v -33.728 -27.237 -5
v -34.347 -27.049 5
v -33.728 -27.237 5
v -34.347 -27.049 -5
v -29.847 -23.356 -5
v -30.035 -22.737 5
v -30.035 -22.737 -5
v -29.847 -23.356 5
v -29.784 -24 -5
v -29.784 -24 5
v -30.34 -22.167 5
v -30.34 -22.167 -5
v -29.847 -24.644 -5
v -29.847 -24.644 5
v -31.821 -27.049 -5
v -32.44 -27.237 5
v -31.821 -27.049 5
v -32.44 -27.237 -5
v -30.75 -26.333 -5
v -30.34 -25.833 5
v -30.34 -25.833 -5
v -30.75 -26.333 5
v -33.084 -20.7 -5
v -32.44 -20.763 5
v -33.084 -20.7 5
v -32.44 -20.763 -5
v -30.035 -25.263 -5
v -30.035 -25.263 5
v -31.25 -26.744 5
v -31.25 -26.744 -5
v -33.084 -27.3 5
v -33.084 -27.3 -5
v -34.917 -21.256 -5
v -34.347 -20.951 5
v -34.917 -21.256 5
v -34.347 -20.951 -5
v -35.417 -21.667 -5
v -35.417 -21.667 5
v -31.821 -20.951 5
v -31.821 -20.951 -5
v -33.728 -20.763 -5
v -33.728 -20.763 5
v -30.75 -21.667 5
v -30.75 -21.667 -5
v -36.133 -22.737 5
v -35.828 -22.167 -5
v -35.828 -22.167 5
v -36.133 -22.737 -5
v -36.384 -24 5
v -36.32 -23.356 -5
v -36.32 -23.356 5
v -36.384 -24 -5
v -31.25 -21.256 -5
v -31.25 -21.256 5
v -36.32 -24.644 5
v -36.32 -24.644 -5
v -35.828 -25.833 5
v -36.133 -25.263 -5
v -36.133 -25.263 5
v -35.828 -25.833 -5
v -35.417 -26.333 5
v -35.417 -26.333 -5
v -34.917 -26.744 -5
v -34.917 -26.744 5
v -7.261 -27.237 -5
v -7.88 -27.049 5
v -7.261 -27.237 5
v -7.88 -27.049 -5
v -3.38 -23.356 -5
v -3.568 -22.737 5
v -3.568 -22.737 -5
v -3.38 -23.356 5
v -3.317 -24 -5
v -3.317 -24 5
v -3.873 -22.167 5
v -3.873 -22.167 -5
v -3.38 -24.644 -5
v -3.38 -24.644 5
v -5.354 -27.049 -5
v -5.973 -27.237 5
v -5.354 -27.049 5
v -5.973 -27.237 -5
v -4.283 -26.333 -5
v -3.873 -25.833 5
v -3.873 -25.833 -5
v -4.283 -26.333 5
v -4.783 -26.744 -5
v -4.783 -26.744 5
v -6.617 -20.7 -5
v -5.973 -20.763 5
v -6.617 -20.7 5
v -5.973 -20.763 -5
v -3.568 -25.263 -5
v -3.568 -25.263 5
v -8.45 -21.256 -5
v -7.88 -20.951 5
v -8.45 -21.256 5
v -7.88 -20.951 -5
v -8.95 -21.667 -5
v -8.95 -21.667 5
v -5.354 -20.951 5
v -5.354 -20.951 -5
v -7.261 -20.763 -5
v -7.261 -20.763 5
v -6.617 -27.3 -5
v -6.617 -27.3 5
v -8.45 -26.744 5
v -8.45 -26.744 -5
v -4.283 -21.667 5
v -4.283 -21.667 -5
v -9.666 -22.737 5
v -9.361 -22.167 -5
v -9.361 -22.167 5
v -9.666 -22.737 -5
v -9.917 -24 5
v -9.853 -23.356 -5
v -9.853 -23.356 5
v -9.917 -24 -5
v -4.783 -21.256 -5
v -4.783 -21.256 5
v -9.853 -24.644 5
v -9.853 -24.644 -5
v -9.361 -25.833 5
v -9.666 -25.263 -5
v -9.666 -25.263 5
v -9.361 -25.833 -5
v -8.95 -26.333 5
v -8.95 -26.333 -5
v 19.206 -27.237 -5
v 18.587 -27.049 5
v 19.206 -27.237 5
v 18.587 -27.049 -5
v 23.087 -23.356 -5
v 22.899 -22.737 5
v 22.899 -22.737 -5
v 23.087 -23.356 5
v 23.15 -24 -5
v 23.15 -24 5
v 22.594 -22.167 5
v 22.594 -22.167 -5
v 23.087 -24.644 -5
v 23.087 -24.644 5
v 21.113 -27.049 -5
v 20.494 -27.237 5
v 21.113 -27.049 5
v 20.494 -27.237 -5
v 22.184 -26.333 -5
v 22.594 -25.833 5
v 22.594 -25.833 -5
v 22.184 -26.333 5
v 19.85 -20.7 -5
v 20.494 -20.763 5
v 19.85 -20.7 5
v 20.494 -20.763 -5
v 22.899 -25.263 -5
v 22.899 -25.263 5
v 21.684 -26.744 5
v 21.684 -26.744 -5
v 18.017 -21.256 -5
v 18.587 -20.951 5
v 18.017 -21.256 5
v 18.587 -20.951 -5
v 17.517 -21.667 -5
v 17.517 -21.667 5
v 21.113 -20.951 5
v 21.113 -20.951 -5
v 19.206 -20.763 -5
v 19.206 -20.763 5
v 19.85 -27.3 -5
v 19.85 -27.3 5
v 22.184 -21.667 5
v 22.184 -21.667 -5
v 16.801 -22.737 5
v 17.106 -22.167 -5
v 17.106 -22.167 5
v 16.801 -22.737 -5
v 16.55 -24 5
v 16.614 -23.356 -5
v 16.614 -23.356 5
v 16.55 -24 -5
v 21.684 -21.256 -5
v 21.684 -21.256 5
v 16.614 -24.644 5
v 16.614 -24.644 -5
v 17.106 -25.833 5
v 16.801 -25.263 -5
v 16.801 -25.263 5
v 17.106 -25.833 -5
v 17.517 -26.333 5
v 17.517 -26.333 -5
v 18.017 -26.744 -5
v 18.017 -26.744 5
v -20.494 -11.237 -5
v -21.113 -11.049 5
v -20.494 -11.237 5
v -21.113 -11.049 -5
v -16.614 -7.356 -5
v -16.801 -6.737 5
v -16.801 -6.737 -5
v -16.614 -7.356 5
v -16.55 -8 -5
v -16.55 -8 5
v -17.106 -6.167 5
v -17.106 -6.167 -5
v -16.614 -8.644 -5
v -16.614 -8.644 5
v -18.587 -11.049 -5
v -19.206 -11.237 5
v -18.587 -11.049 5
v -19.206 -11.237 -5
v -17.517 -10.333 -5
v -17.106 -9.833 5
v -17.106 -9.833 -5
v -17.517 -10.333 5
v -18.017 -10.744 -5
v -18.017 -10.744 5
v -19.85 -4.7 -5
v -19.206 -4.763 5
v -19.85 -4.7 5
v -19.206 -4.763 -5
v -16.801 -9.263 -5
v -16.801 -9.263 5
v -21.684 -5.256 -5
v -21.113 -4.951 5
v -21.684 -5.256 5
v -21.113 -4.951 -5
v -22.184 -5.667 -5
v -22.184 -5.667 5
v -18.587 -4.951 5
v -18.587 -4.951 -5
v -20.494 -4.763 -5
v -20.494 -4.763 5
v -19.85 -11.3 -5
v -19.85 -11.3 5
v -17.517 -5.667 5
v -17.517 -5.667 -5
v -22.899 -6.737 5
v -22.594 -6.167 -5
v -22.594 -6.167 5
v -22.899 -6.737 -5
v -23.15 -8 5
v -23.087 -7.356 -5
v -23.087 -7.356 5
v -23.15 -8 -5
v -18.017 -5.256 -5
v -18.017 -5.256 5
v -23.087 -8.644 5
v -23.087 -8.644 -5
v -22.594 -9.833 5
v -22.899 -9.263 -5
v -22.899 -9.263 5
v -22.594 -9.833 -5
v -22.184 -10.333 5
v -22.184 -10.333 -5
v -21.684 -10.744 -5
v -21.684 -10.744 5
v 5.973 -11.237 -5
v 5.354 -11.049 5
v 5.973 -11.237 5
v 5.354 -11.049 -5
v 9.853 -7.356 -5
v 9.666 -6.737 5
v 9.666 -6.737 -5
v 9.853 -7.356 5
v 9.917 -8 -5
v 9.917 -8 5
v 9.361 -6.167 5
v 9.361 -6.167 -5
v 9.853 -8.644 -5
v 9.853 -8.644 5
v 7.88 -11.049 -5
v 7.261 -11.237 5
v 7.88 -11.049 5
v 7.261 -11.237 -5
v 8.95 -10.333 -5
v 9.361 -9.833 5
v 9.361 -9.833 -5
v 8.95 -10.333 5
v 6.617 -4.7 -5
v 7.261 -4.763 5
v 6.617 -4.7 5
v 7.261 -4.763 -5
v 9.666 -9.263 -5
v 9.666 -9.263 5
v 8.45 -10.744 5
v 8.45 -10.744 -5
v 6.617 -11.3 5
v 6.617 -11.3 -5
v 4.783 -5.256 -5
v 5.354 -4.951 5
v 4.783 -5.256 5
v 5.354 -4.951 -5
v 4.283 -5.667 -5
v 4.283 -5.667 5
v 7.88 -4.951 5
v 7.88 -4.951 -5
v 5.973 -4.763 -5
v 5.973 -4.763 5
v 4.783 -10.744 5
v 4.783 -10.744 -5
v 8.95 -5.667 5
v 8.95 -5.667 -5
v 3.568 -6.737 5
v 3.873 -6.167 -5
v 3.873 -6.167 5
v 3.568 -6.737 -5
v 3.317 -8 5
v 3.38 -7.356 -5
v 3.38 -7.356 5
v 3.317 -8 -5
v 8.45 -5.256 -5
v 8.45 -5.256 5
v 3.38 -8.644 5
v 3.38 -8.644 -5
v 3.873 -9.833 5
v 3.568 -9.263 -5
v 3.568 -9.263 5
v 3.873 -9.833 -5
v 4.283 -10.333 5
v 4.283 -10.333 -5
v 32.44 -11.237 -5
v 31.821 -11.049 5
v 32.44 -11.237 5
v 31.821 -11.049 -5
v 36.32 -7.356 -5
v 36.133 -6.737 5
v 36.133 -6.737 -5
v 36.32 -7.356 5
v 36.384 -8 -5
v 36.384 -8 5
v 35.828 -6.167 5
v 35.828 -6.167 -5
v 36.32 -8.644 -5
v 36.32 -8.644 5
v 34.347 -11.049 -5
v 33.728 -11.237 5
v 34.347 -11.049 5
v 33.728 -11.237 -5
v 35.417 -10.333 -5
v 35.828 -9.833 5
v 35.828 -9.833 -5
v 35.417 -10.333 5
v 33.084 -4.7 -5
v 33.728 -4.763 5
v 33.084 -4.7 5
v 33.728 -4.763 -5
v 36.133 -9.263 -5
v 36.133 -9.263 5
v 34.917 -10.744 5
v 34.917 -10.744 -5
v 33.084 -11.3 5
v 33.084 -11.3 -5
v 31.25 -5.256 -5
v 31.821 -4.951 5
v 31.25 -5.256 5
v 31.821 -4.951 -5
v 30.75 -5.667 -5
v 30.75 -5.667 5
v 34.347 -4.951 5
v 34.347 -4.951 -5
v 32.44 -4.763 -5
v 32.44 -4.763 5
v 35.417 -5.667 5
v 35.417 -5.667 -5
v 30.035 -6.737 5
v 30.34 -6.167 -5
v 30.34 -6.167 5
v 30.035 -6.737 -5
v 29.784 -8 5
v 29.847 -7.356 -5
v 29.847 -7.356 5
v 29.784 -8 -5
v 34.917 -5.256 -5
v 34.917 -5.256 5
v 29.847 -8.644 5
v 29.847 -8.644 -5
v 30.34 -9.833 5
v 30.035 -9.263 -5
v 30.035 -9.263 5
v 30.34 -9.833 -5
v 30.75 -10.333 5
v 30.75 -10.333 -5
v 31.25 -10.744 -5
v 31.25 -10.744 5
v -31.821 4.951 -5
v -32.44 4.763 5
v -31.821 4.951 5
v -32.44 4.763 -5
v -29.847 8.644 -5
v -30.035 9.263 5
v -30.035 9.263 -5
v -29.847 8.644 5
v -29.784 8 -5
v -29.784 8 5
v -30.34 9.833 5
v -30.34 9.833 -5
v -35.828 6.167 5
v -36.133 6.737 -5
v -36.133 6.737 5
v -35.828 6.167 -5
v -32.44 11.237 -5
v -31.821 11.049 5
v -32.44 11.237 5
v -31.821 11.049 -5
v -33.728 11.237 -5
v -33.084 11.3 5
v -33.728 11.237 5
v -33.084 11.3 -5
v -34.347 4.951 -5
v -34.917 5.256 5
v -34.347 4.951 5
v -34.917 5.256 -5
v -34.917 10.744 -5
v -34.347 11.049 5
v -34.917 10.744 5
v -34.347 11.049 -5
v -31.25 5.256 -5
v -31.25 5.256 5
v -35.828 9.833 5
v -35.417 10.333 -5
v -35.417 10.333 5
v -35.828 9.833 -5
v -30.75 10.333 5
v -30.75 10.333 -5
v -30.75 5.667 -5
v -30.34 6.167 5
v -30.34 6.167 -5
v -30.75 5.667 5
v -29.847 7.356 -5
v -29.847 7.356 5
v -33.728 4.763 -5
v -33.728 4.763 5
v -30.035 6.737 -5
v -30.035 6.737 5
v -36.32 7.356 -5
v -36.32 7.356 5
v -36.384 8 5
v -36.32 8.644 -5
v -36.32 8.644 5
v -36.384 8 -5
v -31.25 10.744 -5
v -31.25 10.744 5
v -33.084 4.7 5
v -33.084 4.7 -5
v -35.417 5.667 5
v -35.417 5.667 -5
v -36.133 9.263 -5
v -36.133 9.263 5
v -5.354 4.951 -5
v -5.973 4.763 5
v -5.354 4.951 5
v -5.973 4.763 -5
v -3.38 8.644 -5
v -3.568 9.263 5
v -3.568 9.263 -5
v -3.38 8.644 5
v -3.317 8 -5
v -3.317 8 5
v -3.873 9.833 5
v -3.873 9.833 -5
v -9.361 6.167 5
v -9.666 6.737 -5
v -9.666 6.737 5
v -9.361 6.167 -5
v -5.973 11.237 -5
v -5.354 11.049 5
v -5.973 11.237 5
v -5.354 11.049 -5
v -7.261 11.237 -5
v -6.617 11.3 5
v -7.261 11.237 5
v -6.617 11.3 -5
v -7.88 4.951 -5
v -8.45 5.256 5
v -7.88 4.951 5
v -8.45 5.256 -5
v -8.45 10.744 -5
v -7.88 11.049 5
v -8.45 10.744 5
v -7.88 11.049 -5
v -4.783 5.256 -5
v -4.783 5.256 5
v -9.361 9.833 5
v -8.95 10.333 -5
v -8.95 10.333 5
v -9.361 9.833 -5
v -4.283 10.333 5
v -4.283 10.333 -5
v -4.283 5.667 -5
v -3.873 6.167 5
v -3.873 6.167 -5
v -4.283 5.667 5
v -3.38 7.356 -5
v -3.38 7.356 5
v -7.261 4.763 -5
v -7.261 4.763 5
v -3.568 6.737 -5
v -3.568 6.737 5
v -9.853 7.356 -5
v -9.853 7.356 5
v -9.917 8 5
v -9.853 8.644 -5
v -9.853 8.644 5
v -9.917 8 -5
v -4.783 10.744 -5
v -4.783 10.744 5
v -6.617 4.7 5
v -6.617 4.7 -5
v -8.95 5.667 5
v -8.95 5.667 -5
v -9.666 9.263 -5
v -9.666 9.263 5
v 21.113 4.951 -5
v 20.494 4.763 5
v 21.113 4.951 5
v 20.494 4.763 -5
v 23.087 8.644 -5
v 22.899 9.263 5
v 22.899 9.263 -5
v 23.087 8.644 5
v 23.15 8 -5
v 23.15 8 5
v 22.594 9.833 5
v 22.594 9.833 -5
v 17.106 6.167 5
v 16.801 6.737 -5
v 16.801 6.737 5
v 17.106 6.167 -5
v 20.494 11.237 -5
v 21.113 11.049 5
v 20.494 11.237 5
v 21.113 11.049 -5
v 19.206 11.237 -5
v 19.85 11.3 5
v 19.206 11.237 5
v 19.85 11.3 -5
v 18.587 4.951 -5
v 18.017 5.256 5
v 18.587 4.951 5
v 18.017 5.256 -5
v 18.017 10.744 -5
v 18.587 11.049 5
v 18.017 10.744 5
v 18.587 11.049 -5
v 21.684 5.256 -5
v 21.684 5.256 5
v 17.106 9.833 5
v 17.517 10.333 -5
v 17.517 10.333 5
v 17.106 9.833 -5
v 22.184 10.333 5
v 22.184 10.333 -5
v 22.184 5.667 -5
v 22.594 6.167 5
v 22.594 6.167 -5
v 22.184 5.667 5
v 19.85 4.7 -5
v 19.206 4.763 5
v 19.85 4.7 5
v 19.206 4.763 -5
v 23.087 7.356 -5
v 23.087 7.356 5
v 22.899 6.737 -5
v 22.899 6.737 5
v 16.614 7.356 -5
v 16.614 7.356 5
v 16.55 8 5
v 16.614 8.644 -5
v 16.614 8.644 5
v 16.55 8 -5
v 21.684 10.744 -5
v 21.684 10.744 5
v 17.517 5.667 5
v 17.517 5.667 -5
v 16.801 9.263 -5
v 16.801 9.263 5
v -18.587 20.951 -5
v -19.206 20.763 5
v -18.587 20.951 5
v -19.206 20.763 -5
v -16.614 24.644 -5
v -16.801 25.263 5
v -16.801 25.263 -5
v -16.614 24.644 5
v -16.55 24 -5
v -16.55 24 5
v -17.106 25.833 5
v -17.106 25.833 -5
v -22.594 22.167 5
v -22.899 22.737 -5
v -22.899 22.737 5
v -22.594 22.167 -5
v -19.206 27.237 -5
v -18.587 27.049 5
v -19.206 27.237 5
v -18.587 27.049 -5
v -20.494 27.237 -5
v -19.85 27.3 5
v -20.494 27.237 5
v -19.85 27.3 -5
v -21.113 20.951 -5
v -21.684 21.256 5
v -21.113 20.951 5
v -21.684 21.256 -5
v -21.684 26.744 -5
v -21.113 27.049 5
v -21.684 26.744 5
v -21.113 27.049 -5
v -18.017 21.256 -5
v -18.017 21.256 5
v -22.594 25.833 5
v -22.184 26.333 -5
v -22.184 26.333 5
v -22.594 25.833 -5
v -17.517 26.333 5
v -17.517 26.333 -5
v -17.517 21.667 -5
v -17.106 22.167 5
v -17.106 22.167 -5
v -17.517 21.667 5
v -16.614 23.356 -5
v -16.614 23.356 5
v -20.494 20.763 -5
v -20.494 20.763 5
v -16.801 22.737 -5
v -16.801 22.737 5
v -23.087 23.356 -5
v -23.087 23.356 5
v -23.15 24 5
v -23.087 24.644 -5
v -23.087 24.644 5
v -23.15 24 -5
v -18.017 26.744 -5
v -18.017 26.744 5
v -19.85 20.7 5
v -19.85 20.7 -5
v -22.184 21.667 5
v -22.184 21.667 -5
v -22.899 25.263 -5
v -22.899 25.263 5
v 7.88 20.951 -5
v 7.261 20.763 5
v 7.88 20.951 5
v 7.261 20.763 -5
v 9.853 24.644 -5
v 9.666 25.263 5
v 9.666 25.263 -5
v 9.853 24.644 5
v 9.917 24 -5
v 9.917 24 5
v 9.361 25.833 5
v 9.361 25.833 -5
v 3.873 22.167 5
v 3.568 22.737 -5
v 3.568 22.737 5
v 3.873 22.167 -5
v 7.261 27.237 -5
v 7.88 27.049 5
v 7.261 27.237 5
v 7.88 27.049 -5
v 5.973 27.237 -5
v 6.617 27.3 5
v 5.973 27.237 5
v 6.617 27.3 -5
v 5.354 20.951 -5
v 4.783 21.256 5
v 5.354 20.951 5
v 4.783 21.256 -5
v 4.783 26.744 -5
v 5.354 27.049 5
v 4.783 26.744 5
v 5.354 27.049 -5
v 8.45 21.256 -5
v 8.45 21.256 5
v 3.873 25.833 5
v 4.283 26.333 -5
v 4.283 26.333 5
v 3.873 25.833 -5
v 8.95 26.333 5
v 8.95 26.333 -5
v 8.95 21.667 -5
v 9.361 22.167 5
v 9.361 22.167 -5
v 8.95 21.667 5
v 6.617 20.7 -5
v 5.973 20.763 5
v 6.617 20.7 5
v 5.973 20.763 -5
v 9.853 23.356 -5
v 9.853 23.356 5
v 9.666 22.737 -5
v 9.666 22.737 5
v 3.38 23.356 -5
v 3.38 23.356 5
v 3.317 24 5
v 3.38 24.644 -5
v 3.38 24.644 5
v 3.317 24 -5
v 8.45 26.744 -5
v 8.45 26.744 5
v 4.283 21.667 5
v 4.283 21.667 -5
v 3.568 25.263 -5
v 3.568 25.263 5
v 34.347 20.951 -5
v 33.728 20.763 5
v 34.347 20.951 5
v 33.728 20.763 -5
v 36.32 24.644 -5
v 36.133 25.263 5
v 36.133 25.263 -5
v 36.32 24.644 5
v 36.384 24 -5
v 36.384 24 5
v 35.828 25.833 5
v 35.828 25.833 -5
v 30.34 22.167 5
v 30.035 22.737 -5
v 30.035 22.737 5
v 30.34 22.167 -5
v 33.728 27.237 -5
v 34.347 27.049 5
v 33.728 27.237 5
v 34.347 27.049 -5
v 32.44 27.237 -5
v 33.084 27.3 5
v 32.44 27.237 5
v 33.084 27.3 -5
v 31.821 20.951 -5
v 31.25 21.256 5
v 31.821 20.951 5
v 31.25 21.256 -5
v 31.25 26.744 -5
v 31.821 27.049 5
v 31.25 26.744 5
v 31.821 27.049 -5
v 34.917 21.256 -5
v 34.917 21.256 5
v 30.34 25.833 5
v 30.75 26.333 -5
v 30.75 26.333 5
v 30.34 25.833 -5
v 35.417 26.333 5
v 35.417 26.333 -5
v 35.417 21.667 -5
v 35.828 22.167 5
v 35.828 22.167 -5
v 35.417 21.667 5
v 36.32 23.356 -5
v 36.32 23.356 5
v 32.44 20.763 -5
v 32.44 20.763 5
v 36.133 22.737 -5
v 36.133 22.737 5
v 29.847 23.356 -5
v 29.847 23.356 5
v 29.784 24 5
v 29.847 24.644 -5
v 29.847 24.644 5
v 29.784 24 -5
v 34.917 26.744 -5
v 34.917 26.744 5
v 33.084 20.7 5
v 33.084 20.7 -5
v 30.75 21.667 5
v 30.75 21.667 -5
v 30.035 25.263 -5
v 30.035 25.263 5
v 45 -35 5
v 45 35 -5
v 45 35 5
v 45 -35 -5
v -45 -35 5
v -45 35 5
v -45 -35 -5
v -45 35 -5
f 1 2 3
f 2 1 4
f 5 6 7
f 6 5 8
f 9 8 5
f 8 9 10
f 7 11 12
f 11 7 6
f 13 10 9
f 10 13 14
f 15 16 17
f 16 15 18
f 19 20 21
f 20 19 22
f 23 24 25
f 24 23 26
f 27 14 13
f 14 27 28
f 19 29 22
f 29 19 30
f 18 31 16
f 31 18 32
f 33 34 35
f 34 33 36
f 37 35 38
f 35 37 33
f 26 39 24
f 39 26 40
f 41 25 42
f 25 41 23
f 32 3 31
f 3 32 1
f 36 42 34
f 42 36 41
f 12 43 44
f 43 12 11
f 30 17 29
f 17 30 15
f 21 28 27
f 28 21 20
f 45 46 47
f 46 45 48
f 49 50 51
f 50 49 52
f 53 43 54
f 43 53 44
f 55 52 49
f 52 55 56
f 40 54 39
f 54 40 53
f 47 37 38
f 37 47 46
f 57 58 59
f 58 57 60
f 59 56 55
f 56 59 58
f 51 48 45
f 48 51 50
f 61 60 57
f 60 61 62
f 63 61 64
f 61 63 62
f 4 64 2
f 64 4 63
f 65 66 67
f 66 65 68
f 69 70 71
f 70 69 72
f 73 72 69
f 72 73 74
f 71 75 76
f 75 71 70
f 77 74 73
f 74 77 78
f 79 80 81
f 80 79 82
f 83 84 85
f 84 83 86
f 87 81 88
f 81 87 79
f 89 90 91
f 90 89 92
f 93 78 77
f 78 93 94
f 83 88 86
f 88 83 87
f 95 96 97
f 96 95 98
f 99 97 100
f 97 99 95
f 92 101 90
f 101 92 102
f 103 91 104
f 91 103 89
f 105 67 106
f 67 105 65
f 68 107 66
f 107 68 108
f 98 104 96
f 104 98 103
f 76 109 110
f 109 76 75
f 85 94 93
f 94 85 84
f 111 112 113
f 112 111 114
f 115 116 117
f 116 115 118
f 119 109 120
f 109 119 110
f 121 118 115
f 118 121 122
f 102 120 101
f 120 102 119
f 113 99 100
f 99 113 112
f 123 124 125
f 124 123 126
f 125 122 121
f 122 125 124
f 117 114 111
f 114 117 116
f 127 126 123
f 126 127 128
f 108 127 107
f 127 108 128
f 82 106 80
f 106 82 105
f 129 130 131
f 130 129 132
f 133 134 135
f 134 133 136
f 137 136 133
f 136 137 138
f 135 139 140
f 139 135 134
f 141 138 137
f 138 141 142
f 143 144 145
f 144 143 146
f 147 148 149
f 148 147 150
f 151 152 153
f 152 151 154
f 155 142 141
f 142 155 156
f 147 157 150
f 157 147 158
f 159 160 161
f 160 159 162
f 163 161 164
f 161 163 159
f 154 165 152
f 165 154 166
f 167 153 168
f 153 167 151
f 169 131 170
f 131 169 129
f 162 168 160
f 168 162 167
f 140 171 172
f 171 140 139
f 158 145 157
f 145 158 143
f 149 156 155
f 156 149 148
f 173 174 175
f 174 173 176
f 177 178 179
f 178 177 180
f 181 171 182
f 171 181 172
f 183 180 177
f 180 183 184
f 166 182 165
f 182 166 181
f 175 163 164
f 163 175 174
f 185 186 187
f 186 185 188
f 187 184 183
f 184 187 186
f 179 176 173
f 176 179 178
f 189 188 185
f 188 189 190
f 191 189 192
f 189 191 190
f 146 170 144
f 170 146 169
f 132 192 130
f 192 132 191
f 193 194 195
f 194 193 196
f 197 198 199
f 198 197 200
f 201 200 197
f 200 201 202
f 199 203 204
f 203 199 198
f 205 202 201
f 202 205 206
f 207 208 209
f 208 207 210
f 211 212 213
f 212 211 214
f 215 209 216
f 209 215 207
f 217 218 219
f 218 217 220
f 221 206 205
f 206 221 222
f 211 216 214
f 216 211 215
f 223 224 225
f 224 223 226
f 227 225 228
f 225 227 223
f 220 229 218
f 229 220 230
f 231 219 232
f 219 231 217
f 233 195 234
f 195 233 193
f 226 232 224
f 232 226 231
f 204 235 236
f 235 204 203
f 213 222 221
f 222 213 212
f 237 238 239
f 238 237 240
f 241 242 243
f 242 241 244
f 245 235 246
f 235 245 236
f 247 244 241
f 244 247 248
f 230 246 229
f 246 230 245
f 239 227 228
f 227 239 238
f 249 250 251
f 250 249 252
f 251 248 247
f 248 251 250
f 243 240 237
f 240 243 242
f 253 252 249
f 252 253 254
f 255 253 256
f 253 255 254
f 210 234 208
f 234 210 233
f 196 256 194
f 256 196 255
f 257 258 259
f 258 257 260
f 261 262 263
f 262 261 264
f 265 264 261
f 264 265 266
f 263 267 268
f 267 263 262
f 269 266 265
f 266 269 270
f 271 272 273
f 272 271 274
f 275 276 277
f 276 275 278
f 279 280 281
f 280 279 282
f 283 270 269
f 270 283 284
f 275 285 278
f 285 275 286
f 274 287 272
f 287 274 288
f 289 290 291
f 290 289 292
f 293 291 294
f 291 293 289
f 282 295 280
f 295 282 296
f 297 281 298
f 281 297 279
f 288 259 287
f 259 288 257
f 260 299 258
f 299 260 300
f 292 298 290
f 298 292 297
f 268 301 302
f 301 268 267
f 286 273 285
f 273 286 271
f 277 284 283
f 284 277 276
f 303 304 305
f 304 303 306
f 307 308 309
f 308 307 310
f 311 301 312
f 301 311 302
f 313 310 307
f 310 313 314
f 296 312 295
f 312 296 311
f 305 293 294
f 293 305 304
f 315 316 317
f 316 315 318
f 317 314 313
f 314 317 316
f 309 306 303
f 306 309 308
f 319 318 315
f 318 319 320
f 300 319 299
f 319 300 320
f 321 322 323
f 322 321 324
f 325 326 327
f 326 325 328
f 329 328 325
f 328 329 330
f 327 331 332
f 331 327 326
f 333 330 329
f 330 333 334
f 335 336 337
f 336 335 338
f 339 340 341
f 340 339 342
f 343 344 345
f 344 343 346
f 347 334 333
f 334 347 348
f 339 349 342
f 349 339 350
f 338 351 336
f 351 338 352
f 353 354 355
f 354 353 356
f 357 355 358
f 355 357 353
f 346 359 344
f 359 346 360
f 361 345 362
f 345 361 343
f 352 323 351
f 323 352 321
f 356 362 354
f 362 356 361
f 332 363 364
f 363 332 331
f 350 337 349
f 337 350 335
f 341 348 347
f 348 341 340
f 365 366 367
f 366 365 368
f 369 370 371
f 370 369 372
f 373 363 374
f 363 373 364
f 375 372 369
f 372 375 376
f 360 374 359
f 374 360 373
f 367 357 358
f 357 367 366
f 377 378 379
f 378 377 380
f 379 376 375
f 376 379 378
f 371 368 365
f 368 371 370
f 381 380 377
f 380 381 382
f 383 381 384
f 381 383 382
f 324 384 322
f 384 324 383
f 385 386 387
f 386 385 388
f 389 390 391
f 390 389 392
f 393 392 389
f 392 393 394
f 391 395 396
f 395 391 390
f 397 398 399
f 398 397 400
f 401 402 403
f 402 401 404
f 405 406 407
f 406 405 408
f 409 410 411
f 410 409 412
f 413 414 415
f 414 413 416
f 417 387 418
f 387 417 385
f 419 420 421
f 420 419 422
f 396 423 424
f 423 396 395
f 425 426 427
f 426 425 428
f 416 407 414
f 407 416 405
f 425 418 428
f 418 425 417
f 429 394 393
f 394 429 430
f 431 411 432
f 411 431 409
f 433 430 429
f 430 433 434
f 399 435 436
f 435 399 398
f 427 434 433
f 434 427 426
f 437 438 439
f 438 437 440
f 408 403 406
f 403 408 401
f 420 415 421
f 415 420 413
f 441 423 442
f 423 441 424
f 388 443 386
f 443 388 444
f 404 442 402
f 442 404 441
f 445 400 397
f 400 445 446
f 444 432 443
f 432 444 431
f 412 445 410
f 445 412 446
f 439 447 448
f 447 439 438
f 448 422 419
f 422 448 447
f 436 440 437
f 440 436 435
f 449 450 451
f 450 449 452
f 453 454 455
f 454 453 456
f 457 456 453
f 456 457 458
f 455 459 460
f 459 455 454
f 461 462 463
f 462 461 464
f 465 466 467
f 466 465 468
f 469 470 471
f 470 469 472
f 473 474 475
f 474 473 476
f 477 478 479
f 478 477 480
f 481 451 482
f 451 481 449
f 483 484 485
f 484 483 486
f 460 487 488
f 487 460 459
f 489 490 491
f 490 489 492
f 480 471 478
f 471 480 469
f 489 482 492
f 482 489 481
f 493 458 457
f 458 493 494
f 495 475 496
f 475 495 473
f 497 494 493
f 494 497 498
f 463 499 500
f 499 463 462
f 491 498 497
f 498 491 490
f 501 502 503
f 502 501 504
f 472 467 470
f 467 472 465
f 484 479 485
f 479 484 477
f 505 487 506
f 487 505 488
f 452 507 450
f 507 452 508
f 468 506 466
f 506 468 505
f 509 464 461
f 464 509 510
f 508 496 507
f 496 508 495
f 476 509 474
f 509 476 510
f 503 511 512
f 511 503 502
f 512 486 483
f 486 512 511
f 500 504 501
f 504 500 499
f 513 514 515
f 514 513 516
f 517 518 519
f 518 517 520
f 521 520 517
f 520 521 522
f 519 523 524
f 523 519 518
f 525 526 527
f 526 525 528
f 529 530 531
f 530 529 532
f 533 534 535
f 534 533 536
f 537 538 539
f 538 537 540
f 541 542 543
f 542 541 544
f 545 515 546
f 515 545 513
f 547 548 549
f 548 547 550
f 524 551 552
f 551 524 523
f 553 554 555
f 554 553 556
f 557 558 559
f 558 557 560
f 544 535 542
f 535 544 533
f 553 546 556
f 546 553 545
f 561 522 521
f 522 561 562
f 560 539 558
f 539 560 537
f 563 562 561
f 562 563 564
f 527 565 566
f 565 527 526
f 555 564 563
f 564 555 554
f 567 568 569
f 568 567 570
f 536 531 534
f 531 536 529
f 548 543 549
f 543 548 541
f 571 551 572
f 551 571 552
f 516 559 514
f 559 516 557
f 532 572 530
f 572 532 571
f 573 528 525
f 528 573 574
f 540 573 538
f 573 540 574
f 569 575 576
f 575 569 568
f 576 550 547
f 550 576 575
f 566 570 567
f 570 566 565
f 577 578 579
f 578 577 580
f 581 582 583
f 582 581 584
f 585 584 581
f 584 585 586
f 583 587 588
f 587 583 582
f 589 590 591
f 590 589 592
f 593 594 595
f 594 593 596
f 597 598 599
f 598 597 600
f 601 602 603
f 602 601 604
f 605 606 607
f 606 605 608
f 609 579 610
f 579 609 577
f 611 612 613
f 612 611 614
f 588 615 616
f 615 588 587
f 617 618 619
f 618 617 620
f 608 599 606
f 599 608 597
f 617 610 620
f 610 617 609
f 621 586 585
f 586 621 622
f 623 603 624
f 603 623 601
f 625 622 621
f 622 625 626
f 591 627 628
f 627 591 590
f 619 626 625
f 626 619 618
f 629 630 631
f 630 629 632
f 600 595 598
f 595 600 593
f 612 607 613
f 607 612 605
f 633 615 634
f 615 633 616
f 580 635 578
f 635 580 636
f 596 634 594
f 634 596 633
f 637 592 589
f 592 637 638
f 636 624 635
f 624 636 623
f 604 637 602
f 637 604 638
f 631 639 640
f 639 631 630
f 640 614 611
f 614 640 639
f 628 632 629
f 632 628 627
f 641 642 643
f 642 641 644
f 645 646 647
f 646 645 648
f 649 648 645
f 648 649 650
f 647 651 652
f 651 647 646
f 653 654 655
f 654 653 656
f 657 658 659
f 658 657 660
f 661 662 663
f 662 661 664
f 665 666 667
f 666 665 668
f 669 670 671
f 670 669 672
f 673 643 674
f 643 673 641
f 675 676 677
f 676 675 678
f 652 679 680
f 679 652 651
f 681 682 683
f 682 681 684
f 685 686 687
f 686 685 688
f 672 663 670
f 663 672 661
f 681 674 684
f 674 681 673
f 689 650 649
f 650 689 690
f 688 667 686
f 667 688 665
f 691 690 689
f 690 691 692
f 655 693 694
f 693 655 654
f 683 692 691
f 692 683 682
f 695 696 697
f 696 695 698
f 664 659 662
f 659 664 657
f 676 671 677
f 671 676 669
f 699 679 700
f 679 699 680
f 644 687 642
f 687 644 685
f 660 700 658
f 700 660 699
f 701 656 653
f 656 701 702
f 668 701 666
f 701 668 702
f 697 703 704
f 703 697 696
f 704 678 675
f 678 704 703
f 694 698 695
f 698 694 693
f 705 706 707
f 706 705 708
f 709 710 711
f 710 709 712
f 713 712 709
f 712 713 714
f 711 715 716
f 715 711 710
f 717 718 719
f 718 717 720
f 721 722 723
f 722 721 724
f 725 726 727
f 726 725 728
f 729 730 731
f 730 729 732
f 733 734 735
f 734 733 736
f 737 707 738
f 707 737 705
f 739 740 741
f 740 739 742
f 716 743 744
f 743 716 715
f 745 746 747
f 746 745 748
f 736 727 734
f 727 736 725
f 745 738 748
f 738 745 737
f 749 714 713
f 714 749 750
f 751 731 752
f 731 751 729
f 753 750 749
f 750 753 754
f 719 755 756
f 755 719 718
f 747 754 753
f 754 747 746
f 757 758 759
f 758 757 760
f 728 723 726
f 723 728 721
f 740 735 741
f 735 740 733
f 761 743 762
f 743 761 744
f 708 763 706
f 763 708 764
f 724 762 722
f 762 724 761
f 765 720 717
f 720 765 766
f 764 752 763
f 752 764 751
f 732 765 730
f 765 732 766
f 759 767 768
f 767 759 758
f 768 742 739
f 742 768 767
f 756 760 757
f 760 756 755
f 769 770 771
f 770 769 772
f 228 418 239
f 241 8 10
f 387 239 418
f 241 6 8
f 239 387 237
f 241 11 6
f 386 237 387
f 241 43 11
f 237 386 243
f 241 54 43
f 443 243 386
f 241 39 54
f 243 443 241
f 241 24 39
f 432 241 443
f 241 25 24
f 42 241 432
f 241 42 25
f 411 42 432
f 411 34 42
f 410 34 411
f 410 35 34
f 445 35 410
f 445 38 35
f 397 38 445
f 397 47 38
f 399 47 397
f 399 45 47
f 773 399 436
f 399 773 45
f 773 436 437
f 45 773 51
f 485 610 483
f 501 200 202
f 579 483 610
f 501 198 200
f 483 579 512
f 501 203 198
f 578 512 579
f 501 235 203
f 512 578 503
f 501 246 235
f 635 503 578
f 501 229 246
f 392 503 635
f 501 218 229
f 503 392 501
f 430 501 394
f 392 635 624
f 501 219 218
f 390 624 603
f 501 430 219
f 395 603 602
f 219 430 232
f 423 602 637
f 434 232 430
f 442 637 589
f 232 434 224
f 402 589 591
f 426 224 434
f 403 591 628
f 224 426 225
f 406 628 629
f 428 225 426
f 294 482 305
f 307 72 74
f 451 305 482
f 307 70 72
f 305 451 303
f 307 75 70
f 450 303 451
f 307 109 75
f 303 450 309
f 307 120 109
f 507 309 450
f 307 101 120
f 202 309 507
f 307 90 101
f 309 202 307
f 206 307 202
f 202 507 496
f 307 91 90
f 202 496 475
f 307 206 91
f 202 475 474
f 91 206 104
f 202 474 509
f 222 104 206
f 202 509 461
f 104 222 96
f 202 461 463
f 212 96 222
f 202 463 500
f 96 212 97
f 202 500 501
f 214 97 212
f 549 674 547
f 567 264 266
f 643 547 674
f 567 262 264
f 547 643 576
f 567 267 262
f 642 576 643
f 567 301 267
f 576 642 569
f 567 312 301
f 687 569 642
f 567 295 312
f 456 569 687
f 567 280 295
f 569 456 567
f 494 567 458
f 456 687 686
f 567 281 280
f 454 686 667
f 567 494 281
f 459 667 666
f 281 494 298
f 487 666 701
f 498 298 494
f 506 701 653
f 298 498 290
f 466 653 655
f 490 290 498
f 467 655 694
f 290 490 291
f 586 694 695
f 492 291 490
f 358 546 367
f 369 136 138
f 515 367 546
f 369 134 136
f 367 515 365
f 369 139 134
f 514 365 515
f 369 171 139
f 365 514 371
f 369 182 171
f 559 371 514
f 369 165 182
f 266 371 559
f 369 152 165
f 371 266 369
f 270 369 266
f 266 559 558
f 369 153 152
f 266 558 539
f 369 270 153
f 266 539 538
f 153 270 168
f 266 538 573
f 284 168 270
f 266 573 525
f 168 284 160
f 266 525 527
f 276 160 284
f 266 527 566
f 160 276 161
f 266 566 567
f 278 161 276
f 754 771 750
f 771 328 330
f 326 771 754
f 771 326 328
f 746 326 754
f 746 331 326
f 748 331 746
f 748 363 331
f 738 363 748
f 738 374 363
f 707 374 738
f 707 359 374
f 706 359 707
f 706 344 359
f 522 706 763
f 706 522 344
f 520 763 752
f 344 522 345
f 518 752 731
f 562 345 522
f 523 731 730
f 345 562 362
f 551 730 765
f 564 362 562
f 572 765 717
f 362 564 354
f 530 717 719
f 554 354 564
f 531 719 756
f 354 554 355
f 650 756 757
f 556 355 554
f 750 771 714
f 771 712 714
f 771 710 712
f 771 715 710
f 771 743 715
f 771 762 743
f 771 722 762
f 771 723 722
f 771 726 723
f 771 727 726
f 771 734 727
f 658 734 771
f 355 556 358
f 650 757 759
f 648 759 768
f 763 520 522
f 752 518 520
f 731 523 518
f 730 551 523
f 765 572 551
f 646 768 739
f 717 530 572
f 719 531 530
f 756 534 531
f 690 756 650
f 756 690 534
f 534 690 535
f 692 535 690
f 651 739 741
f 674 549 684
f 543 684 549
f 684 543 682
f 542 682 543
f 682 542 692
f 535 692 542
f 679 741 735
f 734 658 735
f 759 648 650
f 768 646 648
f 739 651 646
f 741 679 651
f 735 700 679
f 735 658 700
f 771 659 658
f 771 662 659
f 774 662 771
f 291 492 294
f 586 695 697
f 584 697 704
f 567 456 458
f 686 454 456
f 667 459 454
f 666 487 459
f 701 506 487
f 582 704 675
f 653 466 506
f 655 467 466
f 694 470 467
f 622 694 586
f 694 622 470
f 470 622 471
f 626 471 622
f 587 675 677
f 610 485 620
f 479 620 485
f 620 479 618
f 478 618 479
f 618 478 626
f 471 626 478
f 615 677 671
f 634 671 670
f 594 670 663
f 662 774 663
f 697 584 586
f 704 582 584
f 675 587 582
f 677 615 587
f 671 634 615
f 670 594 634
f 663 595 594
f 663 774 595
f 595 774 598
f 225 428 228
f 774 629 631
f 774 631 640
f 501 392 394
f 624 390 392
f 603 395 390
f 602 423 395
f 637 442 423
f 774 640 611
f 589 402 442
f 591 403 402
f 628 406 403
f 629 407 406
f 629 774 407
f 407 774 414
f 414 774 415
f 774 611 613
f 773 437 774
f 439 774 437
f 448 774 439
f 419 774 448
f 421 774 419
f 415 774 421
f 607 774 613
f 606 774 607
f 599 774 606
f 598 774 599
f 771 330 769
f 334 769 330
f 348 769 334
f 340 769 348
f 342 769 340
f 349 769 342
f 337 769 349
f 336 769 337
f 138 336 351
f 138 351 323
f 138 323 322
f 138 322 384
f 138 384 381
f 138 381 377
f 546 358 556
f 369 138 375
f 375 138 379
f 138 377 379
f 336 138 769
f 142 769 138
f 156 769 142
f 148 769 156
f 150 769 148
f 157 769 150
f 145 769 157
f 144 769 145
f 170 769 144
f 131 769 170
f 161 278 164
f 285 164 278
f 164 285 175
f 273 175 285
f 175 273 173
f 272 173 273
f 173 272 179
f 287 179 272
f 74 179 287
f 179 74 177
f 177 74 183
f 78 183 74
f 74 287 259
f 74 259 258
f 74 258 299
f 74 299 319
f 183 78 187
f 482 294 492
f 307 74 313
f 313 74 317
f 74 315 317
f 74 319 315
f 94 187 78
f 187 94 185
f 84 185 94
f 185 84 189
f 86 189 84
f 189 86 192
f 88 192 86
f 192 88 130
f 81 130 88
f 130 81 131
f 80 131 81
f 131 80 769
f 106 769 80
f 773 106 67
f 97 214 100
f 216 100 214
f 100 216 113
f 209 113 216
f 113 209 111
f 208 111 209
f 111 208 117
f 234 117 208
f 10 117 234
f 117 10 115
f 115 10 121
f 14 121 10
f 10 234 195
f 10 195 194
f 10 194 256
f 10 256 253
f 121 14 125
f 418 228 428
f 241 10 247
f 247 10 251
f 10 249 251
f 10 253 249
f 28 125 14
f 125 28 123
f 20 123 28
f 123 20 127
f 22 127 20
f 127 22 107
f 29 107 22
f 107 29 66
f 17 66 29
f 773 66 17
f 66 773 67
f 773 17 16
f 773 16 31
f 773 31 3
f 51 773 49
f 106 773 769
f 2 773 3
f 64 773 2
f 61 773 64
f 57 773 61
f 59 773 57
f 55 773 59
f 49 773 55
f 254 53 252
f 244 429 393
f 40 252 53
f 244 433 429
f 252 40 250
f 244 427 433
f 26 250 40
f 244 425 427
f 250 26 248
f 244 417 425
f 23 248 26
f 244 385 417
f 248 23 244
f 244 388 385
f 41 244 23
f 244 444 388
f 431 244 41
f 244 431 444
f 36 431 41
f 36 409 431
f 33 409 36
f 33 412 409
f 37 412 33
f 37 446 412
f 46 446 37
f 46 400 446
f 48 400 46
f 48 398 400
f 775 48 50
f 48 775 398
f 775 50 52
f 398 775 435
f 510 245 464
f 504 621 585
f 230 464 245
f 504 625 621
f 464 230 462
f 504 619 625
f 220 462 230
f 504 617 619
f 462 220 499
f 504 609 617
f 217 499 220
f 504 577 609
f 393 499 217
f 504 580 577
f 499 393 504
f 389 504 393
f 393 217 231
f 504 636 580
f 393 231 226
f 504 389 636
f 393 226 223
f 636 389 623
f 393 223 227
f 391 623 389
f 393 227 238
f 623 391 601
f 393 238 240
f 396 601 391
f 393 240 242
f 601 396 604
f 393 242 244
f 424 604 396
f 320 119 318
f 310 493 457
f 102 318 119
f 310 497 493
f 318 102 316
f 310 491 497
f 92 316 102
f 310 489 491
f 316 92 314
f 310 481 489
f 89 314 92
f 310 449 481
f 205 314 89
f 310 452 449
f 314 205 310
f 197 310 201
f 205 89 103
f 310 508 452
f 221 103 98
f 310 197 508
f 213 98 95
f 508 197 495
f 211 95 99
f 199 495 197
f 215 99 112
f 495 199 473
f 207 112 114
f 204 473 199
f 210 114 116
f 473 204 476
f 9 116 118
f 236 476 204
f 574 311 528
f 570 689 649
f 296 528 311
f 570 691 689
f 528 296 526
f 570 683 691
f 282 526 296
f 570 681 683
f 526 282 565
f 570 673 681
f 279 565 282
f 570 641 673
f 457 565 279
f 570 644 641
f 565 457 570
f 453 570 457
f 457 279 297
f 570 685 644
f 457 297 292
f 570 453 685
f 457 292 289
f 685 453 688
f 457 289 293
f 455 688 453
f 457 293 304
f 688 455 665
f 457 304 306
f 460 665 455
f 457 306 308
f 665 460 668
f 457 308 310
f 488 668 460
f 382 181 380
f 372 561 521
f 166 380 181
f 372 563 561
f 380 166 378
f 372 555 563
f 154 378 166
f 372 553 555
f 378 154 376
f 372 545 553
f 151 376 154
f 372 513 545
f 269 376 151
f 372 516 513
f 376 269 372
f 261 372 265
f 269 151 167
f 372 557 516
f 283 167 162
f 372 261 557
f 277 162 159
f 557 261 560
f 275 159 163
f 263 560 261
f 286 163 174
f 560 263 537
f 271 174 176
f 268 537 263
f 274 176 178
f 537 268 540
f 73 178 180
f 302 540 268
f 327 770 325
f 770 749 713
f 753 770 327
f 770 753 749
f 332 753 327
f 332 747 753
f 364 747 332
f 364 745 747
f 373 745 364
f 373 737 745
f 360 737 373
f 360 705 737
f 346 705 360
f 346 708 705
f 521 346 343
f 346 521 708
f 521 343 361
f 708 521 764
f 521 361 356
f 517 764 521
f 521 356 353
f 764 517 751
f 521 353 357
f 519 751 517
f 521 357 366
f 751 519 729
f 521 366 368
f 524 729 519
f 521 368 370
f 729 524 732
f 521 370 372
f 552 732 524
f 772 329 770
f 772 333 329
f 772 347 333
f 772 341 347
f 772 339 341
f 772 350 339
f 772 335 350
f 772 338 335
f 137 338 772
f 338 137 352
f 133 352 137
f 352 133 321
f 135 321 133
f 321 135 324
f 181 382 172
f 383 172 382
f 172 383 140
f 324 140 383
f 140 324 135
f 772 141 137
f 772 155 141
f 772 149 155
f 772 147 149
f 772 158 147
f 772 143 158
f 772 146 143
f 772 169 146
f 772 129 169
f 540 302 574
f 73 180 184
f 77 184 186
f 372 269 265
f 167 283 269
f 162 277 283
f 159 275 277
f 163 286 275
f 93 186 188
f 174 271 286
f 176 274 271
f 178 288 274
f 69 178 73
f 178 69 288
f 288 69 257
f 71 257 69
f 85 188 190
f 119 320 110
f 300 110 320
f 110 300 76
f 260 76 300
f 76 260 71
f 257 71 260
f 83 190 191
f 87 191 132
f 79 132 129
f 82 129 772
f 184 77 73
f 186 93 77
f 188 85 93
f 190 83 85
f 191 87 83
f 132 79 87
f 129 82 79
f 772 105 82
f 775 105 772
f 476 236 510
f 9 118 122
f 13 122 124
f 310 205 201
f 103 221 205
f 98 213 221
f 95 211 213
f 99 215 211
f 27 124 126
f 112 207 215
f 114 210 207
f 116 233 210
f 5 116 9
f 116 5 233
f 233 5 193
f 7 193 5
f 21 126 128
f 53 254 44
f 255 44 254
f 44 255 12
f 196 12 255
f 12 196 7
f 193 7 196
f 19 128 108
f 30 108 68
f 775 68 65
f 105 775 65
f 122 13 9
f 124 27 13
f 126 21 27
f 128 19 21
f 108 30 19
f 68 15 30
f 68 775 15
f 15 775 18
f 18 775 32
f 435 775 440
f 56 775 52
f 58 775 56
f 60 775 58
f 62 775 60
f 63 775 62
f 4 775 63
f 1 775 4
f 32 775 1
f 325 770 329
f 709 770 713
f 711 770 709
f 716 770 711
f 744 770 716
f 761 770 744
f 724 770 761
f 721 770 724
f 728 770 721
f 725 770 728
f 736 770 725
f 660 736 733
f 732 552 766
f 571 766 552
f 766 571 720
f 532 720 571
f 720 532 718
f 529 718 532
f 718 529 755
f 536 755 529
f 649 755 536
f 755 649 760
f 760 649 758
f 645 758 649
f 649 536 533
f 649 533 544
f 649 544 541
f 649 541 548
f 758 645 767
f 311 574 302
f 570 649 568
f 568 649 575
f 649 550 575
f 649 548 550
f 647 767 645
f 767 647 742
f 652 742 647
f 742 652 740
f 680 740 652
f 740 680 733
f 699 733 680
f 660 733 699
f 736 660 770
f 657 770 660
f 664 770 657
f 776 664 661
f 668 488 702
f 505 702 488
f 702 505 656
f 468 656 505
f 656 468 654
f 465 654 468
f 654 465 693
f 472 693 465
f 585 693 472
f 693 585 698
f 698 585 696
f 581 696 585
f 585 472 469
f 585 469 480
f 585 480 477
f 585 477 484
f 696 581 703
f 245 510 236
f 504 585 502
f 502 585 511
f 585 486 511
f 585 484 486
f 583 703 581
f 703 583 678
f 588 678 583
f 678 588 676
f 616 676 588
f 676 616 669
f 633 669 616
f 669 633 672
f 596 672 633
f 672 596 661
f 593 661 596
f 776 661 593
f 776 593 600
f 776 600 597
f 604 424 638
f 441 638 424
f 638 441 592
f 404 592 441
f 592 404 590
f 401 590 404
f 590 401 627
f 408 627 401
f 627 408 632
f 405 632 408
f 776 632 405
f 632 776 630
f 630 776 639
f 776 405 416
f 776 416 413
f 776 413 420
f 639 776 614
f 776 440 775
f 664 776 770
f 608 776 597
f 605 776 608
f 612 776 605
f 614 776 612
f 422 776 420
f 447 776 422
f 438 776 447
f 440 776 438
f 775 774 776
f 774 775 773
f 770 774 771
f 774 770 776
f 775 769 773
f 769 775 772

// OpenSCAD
$fn = 32;

// ----------------------------------------------------------------------
// Perforated panel 90 x 70 x 10
// 4 x 3 Ø6.6 holes, checker layout
// ----------------------------------------------------------------------

// --- parameters (mm) ---
panel = [90, 70, 10];  // overall size (x, y, z)
hole_d = 6.6;          // hole diameter
pitch_x = 26.467;      // hole pitch along X
pitch_y = 16;          // hole pitch along Y

// --- derived feature positions (mm) ---
margin = hole_d / 2 + 2;            // = 5.3   clearance from the panel edge
row_offset = pitch_x / 2;           // = 13.23   shift of every other row
cols = floor((panel[0] - 2 * margin - row_offset) / pitch_x) + 1;  // = 3   how many columns fit in X
rows = floor((panel[1] - 2 * margin) / pitch_y) + 1;  // = 4   how many rows fit in Y
span_x = (cols - 1) * pitch_x + row_offset;  // = 66.17   width of the field
span_y = (rows - 1) * pitch_y;      // = 48   height of the field
origin_x = -span_x / 2;             // = -33.08   X of the first hole
origin_y = -span_y / 2;             // = -24   Y of the first row
holes = rows * cols;                // = 12   holes in total
feature_centers = [
  [origin_x + 0 * pitch_x, origin_y + 0 * pitch_y],
  [origin_x + 1 * pitch_x, origin_y + 0 * pitch_y],
  [origin_x + 2 * pitch_x, origin_y + 0 * pitch_y],
  [origin_x + row_offset + 0 * pitch_x, origin_y + 1 * pitch_y],
  [origin_x + row_offset + 1 * pitch_x, origin_y + 1 * pitch_y],
  [origin_x + row_offset + 2 * pitch_x, origin_y + 1 * pitch_y],
  [origin_x + 0 * pitch_x, origin_y + 2 * pitch_y],
  [origin_x + 1 * pitch_x, origin_y + 2 * pitch_y],
  [origin_x + 2 * pitch_x, origin_y + 2 * pitch_y],
  [origin_x + row_offset + 0 * pitch_x, origin_y + 3 * pitch_y],
  [origin_x + row_offset + 1 * pitch_x, origin_y + 3 * pitch_y],
  [origin_x + row_offset + 2 * pitch_x, origin_y + 3 * pitch_y]
];   // hole centres, used verbatim by the cutter loop

// panel outline, every hole through
difference() {
  cube(panel, center = true);
  for (centre = feature_centers)
    translate([centre[0], centre[1], 0])
      cylinder(d = hole_d, h = panel[2] + 2, center = true);
}
